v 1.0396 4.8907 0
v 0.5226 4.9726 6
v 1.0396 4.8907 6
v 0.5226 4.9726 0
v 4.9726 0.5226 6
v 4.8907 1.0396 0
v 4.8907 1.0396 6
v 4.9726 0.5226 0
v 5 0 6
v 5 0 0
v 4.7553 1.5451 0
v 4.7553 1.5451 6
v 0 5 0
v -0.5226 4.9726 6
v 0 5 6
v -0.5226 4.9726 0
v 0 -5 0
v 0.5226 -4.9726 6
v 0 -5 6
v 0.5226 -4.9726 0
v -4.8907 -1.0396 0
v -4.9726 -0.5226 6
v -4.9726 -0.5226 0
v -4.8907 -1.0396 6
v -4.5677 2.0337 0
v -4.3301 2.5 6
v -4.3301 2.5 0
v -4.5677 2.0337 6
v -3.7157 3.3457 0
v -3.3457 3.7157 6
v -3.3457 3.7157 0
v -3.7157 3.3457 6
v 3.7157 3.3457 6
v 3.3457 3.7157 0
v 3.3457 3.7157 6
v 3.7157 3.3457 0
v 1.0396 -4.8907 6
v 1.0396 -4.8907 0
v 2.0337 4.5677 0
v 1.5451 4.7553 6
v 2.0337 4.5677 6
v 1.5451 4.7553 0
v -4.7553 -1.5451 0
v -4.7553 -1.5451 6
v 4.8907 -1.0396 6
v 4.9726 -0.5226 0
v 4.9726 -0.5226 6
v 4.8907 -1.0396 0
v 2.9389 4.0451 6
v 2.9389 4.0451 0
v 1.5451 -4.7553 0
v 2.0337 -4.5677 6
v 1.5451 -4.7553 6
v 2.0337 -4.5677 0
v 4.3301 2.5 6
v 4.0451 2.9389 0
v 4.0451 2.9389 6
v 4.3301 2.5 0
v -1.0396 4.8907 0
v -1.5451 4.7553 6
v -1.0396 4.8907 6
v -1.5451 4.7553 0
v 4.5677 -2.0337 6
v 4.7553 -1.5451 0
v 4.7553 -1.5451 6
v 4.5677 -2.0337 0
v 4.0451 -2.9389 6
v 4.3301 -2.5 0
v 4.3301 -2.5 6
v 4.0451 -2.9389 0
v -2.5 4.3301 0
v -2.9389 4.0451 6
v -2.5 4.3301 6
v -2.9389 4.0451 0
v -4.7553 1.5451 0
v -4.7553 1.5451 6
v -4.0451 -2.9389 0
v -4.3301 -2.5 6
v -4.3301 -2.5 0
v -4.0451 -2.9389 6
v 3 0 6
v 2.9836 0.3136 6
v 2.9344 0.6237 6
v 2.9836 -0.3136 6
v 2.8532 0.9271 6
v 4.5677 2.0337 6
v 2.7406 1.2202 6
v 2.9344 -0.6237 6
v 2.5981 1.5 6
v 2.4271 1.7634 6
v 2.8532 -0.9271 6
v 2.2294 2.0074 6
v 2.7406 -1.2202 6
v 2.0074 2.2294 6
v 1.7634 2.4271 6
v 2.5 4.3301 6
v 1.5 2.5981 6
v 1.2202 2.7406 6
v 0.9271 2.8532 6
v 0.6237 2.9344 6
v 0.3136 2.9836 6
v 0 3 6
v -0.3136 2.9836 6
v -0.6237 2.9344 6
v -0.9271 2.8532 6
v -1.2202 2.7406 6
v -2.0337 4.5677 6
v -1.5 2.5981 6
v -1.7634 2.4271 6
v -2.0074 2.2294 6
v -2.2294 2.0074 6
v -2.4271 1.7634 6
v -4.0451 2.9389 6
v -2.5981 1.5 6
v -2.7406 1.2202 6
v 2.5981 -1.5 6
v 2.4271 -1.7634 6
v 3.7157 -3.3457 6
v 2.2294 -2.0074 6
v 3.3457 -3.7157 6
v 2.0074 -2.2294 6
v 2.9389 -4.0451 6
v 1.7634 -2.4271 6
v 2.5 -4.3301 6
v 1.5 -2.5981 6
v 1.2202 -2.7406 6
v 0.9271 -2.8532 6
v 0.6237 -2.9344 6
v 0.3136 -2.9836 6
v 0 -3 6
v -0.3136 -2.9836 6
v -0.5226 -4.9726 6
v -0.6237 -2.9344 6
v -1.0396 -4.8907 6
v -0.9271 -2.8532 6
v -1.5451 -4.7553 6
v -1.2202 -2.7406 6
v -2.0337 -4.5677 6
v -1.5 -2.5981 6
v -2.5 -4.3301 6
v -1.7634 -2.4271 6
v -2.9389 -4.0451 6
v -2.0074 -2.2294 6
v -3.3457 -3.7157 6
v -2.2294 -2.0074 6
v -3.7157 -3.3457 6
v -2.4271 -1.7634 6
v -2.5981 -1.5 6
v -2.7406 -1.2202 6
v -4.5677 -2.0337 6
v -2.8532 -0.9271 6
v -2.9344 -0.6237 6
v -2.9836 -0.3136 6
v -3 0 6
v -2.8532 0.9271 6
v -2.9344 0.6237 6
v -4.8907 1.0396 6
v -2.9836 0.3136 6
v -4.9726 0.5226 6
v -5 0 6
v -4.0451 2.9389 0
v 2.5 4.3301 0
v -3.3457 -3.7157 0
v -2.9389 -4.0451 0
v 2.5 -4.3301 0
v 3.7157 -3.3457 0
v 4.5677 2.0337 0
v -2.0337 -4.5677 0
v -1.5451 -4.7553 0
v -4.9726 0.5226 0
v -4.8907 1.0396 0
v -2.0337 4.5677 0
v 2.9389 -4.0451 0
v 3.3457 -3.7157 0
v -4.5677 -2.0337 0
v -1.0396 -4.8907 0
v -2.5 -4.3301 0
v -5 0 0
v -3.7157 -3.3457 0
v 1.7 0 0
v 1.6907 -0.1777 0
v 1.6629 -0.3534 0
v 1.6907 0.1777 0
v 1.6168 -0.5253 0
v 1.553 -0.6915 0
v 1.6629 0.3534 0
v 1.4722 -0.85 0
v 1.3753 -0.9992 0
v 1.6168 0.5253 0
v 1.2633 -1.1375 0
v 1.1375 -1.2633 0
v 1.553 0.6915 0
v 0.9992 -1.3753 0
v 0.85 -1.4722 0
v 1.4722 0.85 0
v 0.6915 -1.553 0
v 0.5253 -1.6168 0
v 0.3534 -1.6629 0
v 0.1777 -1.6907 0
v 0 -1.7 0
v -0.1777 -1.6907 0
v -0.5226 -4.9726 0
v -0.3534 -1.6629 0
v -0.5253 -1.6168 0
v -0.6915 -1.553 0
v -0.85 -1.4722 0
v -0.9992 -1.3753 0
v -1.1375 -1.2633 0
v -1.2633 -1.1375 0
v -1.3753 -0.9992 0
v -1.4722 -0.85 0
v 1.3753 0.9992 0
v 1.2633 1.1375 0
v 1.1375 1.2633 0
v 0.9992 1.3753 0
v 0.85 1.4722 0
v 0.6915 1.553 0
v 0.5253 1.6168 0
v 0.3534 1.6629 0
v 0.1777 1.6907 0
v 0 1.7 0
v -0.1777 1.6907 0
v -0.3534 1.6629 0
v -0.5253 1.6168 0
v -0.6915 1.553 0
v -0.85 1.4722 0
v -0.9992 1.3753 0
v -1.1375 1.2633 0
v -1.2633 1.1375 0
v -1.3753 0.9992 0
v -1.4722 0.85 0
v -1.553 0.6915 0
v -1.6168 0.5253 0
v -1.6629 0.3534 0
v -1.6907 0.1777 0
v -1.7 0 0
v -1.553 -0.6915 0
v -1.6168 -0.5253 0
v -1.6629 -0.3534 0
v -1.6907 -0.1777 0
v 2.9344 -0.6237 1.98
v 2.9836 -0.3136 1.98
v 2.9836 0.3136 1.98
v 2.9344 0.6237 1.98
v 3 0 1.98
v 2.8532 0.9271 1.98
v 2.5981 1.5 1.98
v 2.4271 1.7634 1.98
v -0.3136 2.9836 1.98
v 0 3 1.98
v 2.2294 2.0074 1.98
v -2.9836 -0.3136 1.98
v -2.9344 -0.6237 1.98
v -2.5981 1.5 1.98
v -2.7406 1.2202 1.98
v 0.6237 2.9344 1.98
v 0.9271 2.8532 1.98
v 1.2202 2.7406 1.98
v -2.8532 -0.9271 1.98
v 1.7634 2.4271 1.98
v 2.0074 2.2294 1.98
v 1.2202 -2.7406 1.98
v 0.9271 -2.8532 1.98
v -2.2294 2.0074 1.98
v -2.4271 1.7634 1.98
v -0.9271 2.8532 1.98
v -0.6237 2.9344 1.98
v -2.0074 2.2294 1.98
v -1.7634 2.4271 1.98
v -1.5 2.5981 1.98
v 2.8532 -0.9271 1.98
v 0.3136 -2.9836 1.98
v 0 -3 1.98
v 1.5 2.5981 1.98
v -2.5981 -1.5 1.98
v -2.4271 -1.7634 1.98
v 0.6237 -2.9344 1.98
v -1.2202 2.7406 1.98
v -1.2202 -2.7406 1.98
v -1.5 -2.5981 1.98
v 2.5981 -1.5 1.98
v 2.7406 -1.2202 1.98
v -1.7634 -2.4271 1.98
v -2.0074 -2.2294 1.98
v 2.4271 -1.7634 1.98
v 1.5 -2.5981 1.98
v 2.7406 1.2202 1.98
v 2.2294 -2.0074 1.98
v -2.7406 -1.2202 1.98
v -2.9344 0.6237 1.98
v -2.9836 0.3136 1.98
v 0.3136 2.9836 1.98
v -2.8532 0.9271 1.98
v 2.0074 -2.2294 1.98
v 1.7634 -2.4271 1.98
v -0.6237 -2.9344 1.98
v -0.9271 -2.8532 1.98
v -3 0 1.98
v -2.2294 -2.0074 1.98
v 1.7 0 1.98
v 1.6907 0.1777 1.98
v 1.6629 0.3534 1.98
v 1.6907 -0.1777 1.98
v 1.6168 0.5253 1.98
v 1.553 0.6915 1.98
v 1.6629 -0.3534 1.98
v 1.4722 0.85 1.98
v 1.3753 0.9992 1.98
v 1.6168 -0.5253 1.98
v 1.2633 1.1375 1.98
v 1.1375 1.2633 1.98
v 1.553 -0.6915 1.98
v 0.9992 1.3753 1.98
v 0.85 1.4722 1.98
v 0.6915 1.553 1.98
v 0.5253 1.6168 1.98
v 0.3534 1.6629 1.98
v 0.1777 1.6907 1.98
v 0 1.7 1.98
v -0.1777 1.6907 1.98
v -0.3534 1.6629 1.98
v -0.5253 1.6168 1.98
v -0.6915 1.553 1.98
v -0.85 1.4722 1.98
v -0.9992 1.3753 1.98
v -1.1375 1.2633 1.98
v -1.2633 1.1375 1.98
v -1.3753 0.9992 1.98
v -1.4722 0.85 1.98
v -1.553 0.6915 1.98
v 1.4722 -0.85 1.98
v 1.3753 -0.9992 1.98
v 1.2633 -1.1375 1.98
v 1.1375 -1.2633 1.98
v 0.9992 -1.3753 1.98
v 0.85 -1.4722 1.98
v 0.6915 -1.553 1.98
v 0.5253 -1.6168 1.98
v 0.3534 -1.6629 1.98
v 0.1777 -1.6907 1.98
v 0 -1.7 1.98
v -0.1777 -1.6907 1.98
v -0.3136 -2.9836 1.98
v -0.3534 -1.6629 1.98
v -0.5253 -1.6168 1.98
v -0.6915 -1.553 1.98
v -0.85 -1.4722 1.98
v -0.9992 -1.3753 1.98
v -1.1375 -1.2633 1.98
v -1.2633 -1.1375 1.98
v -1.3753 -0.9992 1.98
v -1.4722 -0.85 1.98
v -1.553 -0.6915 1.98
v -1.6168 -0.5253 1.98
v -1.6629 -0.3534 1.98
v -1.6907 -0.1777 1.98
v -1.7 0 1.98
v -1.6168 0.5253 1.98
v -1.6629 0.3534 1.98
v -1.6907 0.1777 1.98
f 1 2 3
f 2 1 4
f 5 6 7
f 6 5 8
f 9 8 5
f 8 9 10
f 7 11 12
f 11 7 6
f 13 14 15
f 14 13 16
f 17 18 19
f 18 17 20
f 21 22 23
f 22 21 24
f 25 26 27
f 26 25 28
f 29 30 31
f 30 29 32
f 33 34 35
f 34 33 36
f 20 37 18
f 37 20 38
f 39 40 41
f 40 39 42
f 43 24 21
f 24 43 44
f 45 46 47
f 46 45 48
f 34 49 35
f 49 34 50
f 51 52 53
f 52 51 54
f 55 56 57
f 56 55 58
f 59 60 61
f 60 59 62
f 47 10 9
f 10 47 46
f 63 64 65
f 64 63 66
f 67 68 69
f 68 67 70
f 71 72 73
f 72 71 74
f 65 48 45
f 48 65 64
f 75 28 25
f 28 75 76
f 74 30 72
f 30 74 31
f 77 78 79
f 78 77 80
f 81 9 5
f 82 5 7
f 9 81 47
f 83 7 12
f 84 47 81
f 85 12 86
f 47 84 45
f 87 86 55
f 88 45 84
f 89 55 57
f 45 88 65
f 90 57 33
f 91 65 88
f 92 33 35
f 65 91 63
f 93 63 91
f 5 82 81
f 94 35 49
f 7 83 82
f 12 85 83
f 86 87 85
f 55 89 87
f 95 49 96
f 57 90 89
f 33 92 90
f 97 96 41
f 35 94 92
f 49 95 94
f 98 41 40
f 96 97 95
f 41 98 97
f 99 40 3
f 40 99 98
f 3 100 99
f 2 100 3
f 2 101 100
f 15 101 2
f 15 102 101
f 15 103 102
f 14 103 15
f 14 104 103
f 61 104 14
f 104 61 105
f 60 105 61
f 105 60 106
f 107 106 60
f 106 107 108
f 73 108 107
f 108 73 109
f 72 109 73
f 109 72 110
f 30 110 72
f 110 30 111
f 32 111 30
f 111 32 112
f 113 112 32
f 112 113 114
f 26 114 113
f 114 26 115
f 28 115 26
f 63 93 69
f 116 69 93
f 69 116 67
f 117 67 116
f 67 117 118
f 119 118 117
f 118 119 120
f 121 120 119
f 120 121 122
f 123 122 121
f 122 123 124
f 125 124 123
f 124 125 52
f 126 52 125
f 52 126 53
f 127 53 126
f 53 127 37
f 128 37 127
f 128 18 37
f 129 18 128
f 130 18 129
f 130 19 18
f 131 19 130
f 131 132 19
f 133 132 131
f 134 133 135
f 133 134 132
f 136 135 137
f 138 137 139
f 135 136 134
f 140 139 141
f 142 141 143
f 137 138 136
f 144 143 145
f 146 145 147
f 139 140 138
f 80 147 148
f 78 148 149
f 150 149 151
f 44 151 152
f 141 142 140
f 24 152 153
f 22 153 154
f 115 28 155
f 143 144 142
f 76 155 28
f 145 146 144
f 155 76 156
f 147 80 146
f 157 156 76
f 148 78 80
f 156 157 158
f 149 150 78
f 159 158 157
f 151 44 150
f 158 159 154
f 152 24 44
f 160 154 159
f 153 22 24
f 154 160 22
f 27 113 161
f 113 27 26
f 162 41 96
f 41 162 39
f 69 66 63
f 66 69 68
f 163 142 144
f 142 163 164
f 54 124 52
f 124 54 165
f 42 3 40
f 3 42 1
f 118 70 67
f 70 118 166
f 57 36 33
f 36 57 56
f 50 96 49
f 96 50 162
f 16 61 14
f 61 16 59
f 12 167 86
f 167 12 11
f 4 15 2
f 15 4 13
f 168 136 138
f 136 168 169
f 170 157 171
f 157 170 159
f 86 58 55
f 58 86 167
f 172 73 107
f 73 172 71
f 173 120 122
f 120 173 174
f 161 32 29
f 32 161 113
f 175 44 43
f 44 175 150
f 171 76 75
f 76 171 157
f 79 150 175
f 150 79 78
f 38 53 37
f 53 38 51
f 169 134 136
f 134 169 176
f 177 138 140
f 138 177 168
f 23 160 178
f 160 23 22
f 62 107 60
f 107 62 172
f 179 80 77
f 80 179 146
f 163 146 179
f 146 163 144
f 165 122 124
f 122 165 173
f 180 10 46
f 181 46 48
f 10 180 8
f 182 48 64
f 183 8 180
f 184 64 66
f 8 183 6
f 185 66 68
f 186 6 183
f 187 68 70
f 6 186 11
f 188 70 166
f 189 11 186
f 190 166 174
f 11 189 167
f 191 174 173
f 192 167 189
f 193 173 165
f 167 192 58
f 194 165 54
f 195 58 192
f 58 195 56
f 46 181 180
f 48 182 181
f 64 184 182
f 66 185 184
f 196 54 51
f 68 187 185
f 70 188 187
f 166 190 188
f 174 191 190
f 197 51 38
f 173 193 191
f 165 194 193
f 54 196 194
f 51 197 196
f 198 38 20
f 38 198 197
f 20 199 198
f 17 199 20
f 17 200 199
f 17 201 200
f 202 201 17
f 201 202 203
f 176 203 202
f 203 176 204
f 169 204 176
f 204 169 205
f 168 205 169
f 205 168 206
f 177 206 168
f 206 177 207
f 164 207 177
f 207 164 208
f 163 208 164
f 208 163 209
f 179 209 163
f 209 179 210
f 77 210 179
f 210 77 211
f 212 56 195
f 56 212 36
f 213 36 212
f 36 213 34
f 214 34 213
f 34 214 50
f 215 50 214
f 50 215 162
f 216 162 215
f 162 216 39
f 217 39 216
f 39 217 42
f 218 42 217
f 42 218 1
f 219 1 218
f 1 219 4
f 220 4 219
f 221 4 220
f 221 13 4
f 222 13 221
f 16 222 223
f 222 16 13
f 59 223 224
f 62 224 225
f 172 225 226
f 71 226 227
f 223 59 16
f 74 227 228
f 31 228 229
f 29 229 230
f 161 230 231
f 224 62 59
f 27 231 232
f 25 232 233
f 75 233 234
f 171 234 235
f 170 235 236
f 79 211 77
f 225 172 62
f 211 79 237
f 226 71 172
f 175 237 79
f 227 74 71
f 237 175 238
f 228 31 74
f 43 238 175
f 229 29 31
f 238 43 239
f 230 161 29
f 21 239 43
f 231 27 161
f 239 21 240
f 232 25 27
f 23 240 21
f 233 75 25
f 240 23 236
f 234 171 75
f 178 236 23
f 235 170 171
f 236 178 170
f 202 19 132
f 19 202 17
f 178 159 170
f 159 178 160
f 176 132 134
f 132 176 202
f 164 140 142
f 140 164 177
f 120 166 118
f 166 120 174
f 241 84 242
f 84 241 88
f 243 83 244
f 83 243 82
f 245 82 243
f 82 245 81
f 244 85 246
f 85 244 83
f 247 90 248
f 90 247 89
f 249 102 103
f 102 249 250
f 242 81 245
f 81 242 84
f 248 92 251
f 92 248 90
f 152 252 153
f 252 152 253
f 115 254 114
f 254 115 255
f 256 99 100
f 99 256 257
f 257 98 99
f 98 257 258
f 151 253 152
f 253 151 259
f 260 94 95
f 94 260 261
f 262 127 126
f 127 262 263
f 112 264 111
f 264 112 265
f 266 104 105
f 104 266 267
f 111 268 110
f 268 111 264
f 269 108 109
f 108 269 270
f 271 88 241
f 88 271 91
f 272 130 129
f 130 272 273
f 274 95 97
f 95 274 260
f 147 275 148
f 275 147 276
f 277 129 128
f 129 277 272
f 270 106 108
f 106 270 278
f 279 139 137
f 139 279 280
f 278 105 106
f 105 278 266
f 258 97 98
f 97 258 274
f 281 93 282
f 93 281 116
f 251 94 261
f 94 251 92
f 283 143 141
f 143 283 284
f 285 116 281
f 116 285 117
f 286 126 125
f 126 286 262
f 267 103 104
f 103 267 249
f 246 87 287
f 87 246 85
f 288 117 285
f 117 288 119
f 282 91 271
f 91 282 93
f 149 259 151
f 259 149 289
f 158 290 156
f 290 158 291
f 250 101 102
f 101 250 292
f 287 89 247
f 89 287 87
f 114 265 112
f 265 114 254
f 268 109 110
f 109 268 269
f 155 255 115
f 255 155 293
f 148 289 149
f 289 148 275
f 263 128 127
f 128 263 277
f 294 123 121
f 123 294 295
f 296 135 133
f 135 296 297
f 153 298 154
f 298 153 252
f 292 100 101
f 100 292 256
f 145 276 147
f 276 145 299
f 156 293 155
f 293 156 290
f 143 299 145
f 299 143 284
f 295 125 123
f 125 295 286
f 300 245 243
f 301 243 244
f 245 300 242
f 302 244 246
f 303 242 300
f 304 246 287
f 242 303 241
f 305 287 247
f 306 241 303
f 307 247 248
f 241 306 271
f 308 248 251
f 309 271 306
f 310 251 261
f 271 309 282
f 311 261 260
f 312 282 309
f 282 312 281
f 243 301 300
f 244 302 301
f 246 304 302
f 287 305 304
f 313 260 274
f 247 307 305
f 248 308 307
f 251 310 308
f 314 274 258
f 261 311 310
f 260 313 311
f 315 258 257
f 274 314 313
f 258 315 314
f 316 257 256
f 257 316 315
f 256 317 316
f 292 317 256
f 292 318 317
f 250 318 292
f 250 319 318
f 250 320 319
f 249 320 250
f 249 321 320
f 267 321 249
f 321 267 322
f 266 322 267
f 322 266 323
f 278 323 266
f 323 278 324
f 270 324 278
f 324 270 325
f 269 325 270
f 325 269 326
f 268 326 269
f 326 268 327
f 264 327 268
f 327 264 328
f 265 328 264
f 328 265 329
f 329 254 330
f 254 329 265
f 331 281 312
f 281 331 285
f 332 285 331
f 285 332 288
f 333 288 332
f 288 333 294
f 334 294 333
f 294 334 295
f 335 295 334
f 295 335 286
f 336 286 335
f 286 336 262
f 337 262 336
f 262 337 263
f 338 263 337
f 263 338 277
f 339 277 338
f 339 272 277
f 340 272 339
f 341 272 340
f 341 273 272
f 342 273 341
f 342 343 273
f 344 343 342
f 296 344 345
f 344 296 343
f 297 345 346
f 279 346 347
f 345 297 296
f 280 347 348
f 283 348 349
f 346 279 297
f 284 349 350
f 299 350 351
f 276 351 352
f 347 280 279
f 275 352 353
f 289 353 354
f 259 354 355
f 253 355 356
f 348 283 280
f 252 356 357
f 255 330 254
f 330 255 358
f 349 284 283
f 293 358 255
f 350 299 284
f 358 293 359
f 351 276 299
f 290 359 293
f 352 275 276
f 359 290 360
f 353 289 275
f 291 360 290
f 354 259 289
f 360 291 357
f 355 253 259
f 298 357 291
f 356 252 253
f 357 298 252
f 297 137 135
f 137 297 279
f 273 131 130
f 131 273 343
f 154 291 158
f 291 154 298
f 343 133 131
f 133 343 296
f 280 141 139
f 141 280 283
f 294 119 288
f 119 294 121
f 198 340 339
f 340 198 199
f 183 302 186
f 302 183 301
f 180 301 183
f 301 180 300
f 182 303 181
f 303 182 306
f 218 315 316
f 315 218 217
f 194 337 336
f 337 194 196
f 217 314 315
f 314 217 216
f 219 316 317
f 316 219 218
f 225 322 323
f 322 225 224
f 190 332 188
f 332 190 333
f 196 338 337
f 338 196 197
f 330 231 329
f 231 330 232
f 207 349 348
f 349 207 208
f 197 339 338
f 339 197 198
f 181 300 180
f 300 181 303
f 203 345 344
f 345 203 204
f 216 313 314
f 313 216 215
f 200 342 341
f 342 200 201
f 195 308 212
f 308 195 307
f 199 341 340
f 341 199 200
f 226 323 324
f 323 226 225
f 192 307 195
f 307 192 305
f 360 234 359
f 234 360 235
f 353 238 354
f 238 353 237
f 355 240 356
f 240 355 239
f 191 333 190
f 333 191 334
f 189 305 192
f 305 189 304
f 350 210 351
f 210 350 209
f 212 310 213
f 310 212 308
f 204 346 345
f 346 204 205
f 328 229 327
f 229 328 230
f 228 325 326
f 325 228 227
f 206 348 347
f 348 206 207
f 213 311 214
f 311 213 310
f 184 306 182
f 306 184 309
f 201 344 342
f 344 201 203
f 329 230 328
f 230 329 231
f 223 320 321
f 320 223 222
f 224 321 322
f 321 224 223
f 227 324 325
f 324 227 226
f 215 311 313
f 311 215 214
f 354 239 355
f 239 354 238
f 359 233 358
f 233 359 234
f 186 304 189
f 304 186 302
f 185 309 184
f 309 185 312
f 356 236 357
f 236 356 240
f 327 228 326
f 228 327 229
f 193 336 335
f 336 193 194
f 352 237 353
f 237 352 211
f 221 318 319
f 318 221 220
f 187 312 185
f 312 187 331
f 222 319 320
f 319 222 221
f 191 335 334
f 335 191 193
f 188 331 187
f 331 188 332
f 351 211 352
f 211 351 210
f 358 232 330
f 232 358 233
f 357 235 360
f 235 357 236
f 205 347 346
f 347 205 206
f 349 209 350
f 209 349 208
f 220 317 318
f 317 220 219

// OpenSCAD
// Recessed magnet cup.
$fn = 60;
eps = 0.02;
magnet_d = 6;
wall = 2;
outer_d = magnet_d+2*wall;
height = wall+4;
difference() {
    cylinder(d=outer_d,h=height);
    translate([0,0,wall-eps]) cylinder(d=magnet_d,h=height-wall+2*eps);
    translate([0,0,-eps]) cylinder(d=3.4,h=wall+2*eps);
}
